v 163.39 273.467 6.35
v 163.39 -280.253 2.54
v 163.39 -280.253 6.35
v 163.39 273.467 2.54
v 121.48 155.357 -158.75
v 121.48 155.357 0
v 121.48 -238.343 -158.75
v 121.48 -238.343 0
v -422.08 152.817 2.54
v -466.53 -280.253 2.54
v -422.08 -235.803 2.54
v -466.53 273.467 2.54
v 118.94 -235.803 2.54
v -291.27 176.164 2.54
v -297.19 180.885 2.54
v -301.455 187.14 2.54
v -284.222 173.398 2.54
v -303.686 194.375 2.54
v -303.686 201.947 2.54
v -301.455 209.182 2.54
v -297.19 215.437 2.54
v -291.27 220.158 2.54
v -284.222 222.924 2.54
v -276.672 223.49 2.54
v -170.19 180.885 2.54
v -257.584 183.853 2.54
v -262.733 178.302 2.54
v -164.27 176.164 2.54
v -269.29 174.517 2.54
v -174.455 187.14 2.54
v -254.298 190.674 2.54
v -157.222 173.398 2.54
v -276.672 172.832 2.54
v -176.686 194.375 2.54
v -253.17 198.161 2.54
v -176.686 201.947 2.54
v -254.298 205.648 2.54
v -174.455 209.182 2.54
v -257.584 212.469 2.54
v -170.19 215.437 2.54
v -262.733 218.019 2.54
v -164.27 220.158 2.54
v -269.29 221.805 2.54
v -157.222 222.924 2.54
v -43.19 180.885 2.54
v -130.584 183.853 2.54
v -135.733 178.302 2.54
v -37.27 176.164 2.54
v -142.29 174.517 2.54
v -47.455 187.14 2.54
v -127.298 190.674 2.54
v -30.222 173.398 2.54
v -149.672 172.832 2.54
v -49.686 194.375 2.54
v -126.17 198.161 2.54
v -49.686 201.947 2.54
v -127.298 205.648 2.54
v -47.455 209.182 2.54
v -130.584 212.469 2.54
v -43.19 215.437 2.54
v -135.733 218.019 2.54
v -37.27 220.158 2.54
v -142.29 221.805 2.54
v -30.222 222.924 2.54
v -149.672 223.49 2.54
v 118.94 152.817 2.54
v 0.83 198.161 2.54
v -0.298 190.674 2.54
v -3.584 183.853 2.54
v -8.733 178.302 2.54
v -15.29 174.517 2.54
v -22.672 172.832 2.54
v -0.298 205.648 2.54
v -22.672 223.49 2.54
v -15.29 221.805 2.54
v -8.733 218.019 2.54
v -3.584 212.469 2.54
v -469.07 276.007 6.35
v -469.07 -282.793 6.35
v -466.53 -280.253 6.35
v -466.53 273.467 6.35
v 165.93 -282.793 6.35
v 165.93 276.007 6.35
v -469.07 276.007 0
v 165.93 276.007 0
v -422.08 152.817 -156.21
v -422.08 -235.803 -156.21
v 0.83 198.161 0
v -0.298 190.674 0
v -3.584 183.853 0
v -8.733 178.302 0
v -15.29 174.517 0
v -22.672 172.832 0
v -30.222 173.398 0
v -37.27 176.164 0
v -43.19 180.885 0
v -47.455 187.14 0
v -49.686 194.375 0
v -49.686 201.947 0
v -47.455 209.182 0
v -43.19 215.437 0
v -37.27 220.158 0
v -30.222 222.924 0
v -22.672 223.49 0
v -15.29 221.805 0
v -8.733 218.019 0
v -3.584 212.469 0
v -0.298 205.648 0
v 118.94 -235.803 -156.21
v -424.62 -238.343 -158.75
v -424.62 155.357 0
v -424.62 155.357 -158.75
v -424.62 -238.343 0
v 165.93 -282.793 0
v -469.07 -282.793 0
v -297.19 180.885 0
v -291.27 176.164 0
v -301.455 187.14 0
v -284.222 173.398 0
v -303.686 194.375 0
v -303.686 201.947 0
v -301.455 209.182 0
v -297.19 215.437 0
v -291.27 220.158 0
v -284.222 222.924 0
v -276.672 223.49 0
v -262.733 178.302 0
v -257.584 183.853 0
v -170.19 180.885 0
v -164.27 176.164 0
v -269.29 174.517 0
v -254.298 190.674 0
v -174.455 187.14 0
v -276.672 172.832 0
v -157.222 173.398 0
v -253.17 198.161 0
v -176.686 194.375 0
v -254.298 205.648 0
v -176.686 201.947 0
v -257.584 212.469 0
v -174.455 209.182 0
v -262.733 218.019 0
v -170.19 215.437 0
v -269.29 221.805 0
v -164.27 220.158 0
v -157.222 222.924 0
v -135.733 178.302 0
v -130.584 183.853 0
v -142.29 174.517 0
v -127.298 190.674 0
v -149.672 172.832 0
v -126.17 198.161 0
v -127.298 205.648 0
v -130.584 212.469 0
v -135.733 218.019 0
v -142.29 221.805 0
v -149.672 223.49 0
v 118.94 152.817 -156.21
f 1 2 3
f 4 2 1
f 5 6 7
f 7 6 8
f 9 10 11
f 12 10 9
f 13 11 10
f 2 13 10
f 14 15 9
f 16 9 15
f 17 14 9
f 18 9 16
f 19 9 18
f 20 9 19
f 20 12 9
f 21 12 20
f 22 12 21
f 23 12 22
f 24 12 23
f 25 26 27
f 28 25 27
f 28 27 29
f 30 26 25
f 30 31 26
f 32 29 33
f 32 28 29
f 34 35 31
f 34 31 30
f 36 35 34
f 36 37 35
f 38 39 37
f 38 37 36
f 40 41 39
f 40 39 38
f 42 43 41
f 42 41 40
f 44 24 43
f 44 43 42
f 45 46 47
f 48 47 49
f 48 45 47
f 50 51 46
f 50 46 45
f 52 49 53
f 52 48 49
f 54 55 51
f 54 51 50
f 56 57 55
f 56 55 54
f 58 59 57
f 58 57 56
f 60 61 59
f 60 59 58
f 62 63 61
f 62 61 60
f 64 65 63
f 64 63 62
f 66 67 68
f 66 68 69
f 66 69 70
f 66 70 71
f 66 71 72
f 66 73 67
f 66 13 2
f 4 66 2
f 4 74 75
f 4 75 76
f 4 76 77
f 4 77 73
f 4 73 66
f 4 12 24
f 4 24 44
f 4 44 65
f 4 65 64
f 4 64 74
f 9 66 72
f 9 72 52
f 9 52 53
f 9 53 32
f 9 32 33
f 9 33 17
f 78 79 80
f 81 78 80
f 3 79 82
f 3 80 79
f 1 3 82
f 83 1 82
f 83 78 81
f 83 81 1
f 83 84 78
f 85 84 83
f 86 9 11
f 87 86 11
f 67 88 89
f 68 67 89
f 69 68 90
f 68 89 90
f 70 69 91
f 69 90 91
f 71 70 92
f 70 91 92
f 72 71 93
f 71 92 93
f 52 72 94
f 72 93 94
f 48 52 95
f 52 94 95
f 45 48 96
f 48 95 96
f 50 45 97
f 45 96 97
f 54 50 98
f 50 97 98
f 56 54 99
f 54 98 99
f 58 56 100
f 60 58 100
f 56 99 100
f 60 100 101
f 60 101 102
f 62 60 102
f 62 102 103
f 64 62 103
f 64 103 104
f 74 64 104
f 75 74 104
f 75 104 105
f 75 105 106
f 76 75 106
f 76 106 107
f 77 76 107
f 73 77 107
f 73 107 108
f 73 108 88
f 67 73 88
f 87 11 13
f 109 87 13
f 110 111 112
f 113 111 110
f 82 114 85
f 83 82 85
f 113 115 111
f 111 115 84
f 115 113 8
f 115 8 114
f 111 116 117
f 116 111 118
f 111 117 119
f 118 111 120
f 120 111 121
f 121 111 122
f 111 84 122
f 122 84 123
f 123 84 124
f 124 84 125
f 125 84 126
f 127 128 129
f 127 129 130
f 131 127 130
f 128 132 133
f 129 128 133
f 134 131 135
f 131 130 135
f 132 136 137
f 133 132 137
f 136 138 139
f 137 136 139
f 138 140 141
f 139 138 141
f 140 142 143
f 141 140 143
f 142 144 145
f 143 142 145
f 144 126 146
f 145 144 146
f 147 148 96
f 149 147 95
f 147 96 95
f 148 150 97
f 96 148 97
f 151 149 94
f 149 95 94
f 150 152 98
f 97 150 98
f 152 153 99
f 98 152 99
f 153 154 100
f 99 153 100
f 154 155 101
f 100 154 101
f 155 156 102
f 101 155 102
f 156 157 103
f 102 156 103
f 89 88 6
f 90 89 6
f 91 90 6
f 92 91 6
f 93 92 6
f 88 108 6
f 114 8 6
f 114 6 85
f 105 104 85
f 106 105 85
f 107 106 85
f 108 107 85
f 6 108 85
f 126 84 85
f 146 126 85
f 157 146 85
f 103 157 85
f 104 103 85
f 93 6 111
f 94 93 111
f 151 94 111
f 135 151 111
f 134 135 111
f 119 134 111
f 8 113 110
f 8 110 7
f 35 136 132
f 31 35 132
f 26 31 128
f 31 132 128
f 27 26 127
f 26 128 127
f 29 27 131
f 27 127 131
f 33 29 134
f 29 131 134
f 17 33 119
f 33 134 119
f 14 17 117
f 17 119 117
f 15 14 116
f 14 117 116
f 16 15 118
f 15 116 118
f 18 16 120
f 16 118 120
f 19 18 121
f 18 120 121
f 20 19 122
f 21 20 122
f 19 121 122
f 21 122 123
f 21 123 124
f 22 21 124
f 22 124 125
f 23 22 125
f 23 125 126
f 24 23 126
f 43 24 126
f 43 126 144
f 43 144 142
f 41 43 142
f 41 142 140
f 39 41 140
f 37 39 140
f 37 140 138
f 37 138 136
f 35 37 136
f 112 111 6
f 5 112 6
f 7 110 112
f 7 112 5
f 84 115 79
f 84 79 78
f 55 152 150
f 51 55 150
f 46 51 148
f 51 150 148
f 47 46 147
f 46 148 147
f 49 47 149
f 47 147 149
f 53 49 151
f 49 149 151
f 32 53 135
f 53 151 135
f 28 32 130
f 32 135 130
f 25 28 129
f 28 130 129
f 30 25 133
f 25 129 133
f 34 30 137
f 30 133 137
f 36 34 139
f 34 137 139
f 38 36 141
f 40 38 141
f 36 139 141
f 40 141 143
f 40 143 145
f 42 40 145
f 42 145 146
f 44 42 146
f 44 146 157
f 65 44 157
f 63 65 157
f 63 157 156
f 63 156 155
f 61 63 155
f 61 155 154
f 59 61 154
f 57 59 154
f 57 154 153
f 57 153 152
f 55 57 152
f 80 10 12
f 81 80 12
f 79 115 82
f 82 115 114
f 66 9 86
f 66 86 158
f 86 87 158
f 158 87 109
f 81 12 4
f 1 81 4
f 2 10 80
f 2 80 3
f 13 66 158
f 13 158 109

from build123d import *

# Parameters (mm, degrees)
F0_W     = 635
F0_H     = 558.8
F1_DEPTH = 6.35
F2_W     = 546.1
F2_H     = 393.7
F3_DEPTH = 158.75
F4_T     = -2.54
F2_R     = 25.4
F5_DEPTH = 25.4


with BuildPart() as f1:
    # F0 (on Top) → F1 (new body)
    with BuildSketch(Plane.XY):
        with Locations((-151.5700068397, -3.3926498145)):
            Rectangle(F0_W, F0_H)
    extrude(amount=F1_DEPTH)

    # F2 (on face) → F3 (join)
    with BuildSketch(Plane(origin=(0, 0, 0), x_dir=(1, 0, 0), z_dir=(0, 0, -1))):
        with Locations((-151.5700068397, 41.4926498145)):
            Rectangle(F2_W, F2_H)
    extrude(amount=F3_DEPTH)

    # F4
    f4_openings = [f1.faces().sort_by_distance(p)[0] for p in [
        (-151.570007, -3.39265, 6.35),
    ]]
    offset(amount=F4_T, openings=f4_openings, kind=Kind.INTERSECTION)

    # F2 (on face) → F5 (cut)
    with BuildSketch(Plane(origin=(0, 0, 0), x_dir=(1, 0, 0), z_dir=(0, 0, -1))):
        with Locations((-278.5700068397, -198.1609463692)):
            Circle(F2_R)
        with Locations((-151.5700068397, -198.1609463692)):
            Circle(F2_R)
        with Locations((-24.5700068397, -198.1609463692)):
            Circle(F2_R)
    extrude(amount=-F5_DEPTH, mode=Mode.SUBTRACT)


solid = f1.part
